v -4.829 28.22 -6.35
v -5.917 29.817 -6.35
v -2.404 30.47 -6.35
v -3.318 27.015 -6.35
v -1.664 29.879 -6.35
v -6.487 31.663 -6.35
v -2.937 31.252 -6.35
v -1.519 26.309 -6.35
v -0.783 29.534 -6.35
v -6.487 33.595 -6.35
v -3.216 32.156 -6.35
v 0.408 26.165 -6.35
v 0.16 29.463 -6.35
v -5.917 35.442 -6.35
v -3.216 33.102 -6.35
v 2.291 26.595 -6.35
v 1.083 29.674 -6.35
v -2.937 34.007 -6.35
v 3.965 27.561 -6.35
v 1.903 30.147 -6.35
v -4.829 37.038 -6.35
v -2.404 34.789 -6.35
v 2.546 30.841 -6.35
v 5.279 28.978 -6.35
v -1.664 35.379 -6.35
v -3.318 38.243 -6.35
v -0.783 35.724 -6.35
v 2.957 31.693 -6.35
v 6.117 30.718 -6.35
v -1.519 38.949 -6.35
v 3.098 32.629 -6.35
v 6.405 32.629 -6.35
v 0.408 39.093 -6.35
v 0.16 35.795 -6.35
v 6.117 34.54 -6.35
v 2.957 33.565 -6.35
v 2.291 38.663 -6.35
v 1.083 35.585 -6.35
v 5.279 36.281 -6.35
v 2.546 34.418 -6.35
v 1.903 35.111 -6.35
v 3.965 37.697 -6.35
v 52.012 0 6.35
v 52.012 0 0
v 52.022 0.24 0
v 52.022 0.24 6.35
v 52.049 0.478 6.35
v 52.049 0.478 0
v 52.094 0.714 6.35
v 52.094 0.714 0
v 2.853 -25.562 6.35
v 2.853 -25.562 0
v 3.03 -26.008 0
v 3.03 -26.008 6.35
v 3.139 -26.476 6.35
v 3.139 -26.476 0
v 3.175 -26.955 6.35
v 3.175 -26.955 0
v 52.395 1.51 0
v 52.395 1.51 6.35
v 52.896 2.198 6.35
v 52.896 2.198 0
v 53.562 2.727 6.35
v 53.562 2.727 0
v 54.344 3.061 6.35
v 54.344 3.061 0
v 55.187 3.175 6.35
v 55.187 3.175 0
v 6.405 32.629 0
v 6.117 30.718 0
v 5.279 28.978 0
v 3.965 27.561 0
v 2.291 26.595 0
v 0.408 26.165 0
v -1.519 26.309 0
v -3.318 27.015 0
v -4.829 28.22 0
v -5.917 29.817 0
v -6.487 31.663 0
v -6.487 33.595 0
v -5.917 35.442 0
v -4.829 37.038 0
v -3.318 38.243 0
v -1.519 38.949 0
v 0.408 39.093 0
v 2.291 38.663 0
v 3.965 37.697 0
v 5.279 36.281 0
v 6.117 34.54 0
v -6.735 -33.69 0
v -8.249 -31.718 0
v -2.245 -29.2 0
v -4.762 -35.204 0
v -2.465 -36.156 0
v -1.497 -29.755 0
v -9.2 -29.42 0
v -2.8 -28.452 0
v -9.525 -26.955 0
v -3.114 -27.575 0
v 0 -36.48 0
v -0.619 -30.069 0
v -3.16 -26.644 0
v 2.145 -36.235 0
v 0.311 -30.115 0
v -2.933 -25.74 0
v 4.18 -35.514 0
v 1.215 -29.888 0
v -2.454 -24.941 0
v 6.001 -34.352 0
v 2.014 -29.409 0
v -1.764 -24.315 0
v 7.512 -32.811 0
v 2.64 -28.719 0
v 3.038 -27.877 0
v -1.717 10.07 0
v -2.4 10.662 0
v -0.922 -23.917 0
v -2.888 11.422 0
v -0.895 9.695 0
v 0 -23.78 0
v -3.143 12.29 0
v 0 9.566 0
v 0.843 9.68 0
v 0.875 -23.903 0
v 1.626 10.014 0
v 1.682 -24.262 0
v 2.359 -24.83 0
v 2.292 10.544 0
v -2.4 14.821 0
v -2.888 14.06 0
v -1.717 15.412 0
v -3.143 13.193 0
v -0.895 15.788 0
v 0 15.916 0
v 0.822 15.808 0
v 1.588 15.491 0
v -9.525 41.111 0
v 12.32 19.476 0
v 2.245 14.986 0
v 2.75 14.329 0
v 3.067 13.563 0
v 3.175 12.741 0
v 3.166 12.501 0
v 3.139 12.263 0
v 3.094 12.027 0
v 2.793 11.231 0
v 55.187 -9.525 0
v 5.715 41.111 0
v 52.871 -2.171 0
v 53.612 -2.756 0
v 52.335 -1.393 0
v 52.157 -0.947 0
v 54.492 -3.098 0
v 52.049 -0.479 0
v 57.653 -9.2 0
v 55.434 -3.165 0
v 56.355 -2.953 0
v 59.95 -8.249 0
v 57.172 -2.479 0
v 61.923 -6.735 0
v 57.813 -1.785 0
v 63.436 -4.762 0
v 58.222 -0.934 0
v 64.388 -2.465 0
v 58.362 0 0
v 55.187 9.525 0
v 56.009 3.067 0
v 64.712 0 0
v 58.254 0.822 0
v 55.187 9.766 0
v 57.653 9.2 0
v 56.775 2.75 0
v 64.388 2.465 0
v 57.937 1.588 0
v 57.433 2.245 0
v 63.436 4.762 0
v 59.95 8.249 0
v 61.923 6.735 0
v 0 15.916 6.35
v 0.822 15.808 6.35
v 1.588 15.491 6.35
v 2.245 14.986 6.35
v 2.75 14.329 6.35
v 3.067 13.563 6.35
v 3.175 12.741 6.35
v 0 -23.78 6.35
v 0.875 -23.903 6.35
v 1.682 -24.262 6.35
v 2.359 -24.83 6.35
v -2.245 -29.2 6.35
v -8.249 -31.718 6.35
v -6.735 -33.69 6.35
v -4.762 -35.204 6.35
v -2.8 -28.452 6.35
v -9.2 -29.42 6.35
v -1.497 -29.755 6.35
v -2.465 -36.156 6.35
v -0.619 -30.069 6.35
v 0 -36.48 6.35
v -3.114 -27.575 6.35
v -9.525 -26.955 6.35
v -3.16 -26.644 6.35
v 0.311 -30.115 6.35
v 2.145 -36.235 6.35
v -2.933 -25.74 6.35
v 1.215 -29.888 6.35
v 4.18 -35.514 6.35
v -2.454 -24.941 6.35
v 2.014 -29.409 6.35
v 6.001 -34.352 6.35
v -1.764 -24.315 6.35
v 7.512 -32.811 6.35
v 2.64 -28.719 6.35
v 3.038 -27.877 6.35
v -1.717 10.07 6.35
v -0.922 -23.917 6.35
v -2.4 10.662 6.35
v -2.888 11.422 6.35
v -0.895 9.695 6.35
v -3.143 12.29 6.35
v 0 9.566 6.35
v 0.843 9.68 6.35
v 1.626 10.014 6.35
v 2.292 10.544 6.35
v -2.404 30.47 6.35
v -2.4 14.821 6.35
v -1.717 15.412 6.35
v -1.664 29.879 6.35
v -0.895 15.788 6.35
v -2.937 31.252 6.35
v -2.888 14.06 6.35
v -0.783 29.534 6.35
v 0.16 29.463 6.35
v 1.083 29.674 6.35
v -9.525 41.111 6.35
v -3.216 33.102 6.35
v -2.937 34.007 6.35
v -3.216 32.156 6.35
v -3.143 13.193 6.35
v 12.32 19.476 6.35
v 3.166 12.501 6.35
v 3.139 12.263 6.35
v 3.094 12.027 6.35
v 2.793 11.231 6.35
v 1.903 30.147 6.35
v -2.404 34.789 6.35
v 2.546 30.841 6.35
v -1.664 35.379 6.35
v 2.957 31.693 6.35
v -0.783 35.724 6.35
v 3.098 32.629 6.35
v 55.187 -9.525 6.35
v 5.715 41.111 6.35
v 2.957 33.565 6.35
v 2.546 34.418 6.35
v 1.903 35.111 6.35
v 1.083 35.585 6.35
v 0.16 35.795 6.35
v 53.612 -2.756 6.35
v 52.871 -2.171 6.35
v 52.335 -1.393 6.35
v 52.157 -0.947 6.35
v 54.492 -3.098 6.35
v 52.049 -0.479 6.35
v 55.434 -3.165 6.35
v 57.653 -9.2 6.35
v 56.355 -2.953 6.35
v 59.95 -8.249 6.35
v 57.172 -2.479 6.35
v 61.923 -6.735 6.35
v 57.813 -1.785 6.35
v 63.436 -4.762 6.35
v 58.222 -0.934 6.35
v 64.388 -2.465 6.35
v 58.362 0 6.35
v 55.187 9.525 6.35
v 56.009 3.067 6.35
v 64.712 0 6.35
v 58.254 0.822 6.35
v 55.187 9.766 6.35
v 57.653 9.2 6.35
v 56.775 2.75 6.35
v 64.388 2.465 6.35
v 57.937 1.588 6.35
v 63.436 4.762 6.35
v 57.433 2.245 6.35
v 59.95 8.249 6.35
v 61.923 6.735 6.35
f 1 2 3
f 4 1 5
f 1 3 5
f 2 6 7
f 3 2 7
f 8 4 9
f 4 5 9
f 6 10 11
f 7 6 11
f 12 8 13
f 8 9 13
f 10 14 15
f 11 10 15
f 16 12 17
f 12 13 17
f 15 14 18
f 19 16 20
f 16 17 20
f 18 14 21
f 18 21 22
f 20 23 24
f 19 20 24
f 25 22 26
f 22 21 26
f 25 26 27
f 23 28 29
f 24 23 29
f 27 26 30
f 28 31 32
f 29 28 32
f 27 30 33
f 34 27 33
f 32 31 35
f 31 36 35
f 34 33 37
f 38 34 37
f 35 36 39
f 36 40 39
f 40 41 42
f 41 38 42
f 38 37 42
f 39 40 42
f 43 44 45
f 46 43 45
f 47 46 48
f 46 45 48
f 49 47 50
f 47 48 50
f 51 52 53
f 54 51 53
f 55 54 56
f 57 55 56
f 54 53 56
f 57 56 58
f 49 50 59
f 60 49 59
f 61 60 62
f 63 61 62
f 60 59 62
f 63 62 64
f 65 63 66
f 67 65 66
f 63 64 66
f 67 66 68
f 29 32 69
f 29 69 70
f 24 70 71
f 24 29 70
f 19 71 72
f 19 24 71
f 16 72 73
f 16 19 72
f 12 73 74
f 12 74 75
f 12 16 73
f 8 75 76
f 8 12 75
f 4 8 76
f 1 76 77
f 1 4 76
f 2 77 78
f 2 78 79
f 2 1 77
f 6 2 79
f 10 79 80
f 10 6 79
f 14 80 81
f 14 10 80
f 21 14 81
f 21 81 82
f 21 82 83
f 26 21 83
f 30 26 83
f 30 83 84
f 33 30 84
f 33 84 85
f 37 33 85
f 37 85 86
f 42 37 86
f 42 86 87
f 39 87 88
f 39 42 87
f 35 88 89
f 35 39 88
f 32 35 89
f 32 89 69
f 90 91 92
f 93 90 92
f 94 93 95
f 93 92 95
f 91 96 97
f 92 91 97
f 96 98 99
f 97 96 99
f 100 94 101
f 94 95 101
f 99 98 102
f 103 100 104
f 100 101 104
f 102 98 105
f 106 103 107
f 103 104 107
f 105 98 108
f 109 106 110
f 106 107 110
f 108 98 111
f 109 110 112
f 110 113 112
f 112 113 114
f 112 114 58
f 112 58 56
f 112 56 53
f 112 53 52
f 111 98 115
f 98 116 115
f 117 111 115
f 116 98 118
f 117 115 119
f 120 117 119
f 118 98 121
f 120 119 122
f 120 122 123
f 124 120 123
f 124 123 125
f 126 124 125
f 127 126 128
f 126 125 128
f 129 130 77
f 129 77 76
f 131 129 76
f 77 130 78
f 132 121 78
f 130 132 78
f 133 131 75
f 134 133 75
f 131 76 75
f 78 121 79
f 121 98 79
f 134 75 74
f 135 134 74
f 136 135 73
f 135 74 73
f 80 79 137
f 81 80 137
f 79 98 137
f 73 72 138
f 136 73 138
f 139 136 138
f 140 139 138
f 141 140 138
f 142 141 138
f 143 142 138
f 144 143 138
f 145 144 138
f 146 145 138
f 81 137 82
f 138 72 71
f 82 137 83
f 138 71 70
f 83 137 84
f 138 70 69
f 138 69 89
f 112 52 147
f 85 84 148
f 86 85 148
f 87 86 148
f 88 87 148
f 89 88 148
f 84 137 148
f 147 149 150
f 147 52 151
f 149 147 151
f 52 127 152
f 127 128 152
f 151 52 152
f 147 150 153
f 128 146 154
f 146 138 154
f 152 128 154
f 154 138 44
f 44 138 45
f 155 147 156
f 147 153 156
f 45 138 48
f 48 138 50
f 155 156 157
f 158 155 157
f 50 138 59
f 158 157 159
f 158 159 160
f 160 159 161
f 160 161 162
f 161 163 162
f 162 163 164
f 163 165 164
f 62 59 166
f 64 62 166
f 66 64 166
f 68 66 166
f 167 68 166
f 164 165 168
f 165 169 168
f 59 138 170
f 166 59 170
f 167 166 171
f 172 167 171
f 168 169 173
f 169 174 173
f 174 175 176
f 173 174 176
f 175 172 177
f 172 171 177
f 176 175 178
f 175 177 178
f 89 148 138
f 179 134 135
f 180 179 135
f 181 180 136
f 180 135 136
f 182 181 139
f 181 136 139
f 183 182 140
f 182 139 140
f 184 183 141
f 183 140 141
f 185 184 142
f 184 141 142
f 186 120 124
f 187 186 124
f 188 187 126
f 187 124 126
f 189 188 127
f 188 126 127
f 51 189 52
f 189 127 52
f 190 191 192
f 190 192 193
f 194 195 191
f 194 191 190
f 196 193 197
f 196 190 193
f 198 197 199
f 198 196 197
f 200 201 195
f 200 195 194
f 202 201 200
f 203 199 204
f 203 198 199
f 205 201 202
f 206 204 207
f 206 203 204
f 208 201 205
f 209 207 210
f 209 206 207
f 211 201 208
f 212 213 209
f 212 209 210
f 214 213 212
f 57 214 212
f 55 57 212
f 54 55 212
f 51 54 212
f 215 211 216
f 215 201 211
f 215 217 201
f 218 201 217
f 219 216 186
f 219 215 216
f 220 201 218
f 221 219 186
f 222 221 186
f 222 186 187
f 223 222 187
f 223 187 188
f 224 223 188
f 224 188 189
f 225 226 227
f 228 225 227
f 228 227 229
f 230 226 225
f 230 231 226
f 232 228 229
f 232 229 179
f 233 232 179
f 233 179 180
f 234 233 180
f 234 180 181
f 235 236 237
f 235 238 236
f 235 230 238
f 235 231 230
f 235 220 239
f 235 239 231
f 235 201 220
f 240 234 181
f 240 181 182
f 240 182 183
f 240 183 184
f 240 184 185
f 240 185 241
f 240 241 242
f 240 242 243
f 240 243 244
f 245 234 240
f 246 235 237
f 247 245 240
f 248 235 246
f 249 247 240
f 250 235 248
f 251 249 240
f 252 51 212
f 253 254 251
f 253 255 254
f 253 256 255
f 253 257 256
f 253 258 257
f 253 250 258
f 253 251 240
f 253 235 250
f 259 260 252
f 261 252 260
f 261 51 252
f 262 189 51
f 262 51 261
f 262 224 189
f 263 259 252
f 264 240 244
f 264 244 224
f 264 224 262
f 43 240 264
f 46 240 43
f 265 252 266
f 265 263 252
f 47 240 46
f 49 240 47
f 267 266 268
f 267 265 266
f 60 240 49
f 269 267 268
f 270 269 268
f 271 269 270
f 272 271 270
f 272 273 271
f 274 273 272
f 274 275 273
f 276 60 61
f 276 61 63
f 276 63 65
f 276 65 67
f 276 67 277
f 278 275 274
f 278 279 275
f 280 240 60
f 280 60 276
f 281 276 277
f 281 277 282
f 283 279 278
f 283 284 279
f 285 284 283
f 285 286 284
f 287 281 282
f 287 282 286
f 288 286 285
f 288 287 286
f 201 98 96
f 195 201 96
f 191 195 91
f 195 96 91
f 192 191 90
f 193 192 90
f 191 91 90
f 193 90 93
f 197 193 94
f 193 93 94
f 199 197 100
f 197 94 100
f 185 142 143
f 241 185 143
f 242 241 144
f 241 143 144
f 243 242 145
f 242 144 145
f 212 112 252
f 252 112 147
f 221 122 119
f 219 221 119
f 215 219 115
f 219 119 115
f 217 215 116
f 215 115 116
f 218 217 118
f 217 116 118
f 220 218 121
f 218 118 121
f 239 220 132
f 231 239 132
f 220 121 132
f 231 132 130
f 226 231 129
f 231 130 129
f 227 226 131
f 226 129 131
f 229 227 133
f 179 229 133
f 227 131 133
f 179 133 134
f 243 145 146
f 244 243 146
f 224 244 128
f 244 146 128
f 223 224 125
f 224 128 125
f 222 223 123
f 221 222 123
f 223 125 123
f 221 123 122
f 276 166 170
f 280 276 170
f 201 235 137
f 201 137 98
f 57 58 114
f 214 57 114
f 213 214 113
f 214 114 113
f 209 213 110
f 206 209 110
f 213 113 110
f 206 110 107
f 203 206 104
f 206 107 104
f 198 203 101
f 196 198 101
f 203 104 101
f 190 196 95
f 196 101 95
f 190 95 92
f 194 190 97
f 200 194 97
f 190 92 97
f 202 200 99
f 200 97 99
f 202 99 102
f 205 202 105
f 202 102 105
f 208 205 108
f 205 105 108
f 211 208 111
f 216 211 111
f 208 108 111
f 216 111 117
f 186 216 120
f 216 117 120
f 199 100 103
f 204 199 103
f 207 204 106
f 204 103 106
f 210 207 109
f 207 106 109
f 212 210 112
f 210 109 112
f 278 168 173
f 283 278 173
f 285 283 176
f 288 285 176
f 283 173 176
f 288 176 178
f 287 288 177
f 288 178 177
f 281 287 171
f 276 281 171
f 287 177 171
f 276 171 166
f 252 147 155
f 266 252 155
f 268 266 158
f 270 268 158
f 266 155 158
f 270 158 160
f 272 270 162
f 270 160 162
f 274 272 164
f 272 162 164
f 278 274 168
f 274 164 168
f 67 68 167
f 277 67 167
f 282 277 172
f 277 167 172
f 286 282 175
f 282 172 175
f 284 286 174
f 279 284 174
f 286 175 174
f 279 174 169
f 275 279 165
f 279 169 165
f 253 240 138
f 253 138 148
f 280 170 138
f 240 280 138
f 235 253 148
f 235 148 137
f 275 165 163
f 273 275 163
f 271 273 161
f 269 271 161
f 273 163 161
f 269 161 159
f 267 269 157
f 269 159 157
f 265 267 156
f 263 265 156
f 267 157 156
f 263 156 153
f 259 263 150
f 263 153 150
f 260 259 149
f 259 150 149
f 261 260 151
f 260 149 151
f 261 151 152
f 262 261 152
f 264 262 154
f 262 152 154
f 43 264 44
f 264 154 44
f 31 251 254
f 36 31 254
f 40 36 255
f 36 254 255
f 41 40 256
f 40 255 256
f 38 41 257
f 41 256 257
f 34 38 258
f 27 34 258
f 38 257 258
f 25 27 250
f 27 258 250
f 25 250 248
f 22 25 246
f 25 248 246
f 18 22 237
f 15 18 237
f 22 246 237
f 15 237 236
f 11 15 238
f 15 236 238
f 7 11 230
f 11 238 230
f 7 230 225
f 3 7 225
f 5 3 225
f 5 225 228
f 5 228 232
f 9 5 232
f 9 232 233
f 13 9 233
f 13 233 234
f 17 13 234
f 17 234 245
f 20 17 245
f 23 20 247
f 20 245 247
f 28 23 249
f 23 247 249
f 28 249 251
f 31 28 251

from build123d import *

# Parameters (mm, degrees)
F1_DEPTH = 6.35
F2_R     = 3.175
F3_DEPTH = 12.7
F4_R     = 6.4822420389
F5_DEPTH = 6.35


with BuildPart() as f1:
    # F0 (on Top) → F1 (new body)
    with BuildSketch(Plane.XY):
        with BuildLine():
            Line((0, -17.430102046), (0, 0))
            Line((0, 0), (0, 3.216402))
            ThreePointArc((0, 3.216402), (-6.7351920908, 6.0062099092), (-9.525, 12.741402))
            Line((-9.525, 12.741402), (-9.525, -26.955102046))
            ThreePointArc((-9.525, -26.955102046), (-6.7351920908, -20.2199099552), (0, -17.430102046))
        make_face()
        with BuildLine():
            ThreePointArc((-9.525, 12.741402), (-6.7351920908, 6.0062099092), (0, 3.216402))
            Line((0, 3.216402), (0, 9.566402))
            ThreePointArc((0, 9.566402), (-3.175, 12.741402), (0, 15.916402))
            Line((0, 15.916402), (0, 22.266402))
            ThreePointArc((0, 22.266402), (-6.7351920908, 19.4765940908), (-9.525, 12.741402))
        make_face()
        with BuildLine():
            Line((0, -23.780102046), (0, -17.430102046))
            ThreePointArc((0, -17.430102046), (-6.7351920908, -20.2199099552), (-9.525, -26.955102046))
            ThreePointArc((-9.525, -26.955102046), (-6.7351920908, -33.6902941368), (0, -36.480102046))
            Line((0, -36.480102046), (7.5123847033, -32.8108429103))
            ThreePointArc((7.5123847033, -32.8108429103), (9.007804652, -30.0510801387), (9.525, -26.955102046))
            ThreePointArc((9.525, -26.955102046), (9.2802728088, -24.809837122), (8.5586668568, -22.7748093967))
            Line((8.5586668568, -22.7748093967), (2.8528889523, -25.5616711629))
            ThreePointArc((2.8528889523, -25.5616711629), (3.0934242696, -26.240013738), (3.175, -26.955102046))
            ThreePointArc((3.175, -26.955102046), (-2.2450640303, -29.2001660763), (0, -23.780102046))
        make_face()
        with BuildLine():
            ThreePointArc((9.525, 12.741402), (9.463768469, 11.6631110537), (9.2808611307, 10.5986837096))
            Line((9.2808611307, 10.5986837096), (45.9066000969, 2.1427182904))
            ThreePointArc((45.9066000969, 2.1427182904), (49.2580332078, 7.4543617002), (55.1874612276, 9.525))
            Line((55.1874612276, 9.525), (55.1874612276, 9.7662775009))
            Line((55.1874612276, 9.7662775009), (4.1043156247, 21.3367622748))
            ThreePointArc((4.1043156247, 21.3367622748), (8.0566503997, 17.8223477129), (9.525, 12.741402))
        make_face()
        with BuildLine():
            Line((3.0936203769, 12.0271625699), (9.2808611307, 10.5986837096))
            ThreePointArc((9.2808611307, 10.5986837096), (9.463768469, 11.6631110537), (9.525, 12.741402))
            ThreePointArc((9.525, 12.741402), (8.0566503997, 17.8223477129), (4.1043156247, 21.3367622748))
            Line((4.1043156247, 21.3367622748), (0, 22.266402))
            Line((0, 22.266402), (0, 15.916402))
            ThreePointArc((0, 15.916402), (2.2450640303, 14.9864660303), (3.175, 12.741402))
            ThreePointArc((3.175, 12.741402), (3.1545894897, 12.3819716846), (3.0936203769, 12.0271625699))
        make_face()
        with BuildLine():
            ThreePointArc((55.1874612276, 9.525), (49.2580332078, 7.4543617002), (45.9066000969, 2.1427182904))
            Line((45.9066000969, 2.1427182904), (52.0938408507, 0.7142394301))
            ThreePointArc((52.0938408507, 0.7142394301), (53.210985221, 2.4847872334), (55.1874612276, 3.175))
            Line((55.1874612276, 3.175), (55.1874612276, 9.525))
        make_face()
        with BuildLine():
            ThreePointArc((55.1874612276, -9.525), (50.1422487685, -8.0790752096), (46.6287943708, -4.1802926493))
            Line((46.6287943708, -4.1802926493), (8.5586668568, -22.7748093967))
            ThreePointArc((8.5586668568, -22.7748093967), (9.2802728088, -24.809837122), (9.525, -26.955102046))
            ThreePointArc((9.525, -26.955102046), (9.007804652, -30.0510801387), (7.5123847033, -32.8108429103))
            Line((7.5123847033, -32.8108429103), (55.1874612276, -9.525))
        make_face()
        with BuildLine():
            Line((52.3345722753, -1.3934308831), (46.6287943708, -4.1802926493))
            ThreePointArc((46.6287943708, -4.1802926493), (50.1422487685, -8.0790752096), (55.1874612276, -9.525))
            ThreePointArc((55.1874612276, -9.525), (61.9226533184, -6.7351920908), (64.7124612276, 0))
            ThreePointArc((64.7124612276, 0), (61.9226533184, 6.7351920908), (55.1874612276, 9.525))
            Line((55.1874612276, 9.525), (55.1874612276, 3.175))
            ThreePointArc((55.1874612276, 3.175), (57.4325252579, 2.2450640303), (58.3624612276, 0))
            ThreePointArc((58.3624612276, 0), (55.9025495356, -3.0934242696), (52.3345722753, -1.3934308831))
        make_face()
        with BuildLine():
            ThreePointArc((4.1043156247, 21.3367622748), (2.1041409628, 22.0310852997), (0, 22.266402))
            Line((0, 22.266402), (4.1043156247, 21.3367622748))
        make_face()
        with BuildLine():
            Line((7.5123847033, -32.8108429103), (0, -36.480102046))
            ThreePointArc((0, -36.480102046), (4.1802926493, -35.5137689028), (7.5123847033, -32.8108429103))
        make_face()
        with BuildLine():
            Line((0, 3.216402), (0, 0))
            Line((0, 0), (45.6624612276, 0))
            ThreePointArc((45.6624612276, 0), (45.7236927586, 1.0782909463), (45.9066000969, 2.1427182904))
            Line((45.9066000969, 2.1427182904), (9.2808611307, 10.5986837096))
            ThreePointArc((9.2808611307, 10.5986837096), (5.9294280198, 5.2870402998), (0, 3.216402))
        make_face()
        with BuildLine():
            Line((0, 9.566402), (0, 3.216402))
            ThreePointArc((0, 3.216402), (5.9294280198, 5.2870402998), (9.2808611307, 10.5986837096))
            Line((9.2808611307, 10.5986837096), (3.0936203769, 12.0271625699))
            ThreePointArc((3.0936203769, 12.0271625699), (1.9764760066, 10.2566147666), (0, 9.566402))
        make_face()
        with BuildLine():
            Line((45.6624612276, 0), (0, 0))
            Line((0, 0), (0, -17.430102046))
            ThreePointArc((0, -17.430102046), (5.0452124591, -18.8760268364), (8.5586668568, -22.7748093967))
            Line((8.5586668568, -22.7748093967), (46.6287943708, -4.1802926493))
            ThreePointArc((46.6287943708, -4.1802926493), (45.9071884188, -2.145264924), (45.6624612276, 0))
        make_face()
        with BuildLine():
            ThreePointArc((8.5586668568, -22.7748093967), (5.0452124591, -18.8760268364), (0, -17.430102046))
            Line((0, -17.430102046), (0, -23.780102046))
            ThreePointArc((0, -23.780102046), (1.6817374864, -24.2620769761), (2.8528889523, -25.5616711629))
            Line((2.8528889523, -25.5616711629), (8.5586668568, -22.7748093967))
        make_face()
        with BuildLine():
            Line((52.0124612276, 0), (45.6624612276, 0))
            ThreePointArc((45.6624612276, 0), (45.9071884188, -2.145264924), (46.6287943708, -4.1802926493))
            Line((46.6287943708, -4.1802926493), (52.3345722753, -1.3934308831))
            ThreePointArc((52.3345722753, -1.3934308831), (52.094036958, -0.715088308), (52.0124612276, 0))
        make_face()
        with BuildLine():
            ThreePointArc((45.9066000969, 2.1427182904), (45.7236927586, 1.0782909463), (45.6624612276, 0))
            Line((45.6624612276, 0), (52.0124612276, 0))
            ThreePointArc((52.0124612276, 0), (52.0328717379, 0.3594303154), (52.0938408507, 0.7142394301))
            Line((52.0938408507, 0.7142394301), (45.9066000969, 2.1427182904))
        make_face()
    extrude(amount=F1_DEPTH)

    # F2 (on face) → F3 (join)
    with BuildSketch(Plane.XY.offset(6.35)):
        with BuildLine():
            Line((-9.525, 41.1111302674), (-9.525, 12.741402))
            ThreePointArc((-9.525, 12.741402), (-5.0809457129, 20.7980523997), (4.1043156247, 21.3367622748))
            Line((4.1043156247, 21.3367622748), (12.3195811982, 19.4759801301))
            Line((12.3195811982, 19.4759801301), (5.7150009088, 41.1111302674))
            Line((5.7150009088, 41.1111302674), (-9.525, 41.1111302674))
        make_face()
        with Locations((-0.0769013266, 32.6290909023)):
            Circle(F2_R, mode=Mode.SUBTRACT)
    extrude(amount=-F3_DEPTH)

    # F4 (on face) → F5 (cut)
    with BuildSketch(Plane(origin=(0, 0, -6.35), x_dir=(1, 0, 0), z_dir=(0, 0, -1))):
        with BuildLine():
            Line((-9.525, -41.1111302674), (5.7150009088, -41.1111302674))
            Line((5.7150009088, -41.1111302674), (12.3195811982, -19.4759801301))
            Line((12.3195811982, -19.4759801301), (4.1043156247, -21.3367622748))
            ThreePointArc((4.1043156247, -21.3367622748), (-5.0809457129, -20.7980523997), (-9.525, -12.741402))
            Line((-9.525, -12.741402), (-9.525, -41.1111302674))
        make_face()
        with Locations((-0.0769013266, -32.6290909023)):
            Circle(F4_R, mode=Mode.SUBTRACT)
    extrude(amount=-F5_DEPTH, mode=Mode.SUBTRACT)


solid = f1.part
